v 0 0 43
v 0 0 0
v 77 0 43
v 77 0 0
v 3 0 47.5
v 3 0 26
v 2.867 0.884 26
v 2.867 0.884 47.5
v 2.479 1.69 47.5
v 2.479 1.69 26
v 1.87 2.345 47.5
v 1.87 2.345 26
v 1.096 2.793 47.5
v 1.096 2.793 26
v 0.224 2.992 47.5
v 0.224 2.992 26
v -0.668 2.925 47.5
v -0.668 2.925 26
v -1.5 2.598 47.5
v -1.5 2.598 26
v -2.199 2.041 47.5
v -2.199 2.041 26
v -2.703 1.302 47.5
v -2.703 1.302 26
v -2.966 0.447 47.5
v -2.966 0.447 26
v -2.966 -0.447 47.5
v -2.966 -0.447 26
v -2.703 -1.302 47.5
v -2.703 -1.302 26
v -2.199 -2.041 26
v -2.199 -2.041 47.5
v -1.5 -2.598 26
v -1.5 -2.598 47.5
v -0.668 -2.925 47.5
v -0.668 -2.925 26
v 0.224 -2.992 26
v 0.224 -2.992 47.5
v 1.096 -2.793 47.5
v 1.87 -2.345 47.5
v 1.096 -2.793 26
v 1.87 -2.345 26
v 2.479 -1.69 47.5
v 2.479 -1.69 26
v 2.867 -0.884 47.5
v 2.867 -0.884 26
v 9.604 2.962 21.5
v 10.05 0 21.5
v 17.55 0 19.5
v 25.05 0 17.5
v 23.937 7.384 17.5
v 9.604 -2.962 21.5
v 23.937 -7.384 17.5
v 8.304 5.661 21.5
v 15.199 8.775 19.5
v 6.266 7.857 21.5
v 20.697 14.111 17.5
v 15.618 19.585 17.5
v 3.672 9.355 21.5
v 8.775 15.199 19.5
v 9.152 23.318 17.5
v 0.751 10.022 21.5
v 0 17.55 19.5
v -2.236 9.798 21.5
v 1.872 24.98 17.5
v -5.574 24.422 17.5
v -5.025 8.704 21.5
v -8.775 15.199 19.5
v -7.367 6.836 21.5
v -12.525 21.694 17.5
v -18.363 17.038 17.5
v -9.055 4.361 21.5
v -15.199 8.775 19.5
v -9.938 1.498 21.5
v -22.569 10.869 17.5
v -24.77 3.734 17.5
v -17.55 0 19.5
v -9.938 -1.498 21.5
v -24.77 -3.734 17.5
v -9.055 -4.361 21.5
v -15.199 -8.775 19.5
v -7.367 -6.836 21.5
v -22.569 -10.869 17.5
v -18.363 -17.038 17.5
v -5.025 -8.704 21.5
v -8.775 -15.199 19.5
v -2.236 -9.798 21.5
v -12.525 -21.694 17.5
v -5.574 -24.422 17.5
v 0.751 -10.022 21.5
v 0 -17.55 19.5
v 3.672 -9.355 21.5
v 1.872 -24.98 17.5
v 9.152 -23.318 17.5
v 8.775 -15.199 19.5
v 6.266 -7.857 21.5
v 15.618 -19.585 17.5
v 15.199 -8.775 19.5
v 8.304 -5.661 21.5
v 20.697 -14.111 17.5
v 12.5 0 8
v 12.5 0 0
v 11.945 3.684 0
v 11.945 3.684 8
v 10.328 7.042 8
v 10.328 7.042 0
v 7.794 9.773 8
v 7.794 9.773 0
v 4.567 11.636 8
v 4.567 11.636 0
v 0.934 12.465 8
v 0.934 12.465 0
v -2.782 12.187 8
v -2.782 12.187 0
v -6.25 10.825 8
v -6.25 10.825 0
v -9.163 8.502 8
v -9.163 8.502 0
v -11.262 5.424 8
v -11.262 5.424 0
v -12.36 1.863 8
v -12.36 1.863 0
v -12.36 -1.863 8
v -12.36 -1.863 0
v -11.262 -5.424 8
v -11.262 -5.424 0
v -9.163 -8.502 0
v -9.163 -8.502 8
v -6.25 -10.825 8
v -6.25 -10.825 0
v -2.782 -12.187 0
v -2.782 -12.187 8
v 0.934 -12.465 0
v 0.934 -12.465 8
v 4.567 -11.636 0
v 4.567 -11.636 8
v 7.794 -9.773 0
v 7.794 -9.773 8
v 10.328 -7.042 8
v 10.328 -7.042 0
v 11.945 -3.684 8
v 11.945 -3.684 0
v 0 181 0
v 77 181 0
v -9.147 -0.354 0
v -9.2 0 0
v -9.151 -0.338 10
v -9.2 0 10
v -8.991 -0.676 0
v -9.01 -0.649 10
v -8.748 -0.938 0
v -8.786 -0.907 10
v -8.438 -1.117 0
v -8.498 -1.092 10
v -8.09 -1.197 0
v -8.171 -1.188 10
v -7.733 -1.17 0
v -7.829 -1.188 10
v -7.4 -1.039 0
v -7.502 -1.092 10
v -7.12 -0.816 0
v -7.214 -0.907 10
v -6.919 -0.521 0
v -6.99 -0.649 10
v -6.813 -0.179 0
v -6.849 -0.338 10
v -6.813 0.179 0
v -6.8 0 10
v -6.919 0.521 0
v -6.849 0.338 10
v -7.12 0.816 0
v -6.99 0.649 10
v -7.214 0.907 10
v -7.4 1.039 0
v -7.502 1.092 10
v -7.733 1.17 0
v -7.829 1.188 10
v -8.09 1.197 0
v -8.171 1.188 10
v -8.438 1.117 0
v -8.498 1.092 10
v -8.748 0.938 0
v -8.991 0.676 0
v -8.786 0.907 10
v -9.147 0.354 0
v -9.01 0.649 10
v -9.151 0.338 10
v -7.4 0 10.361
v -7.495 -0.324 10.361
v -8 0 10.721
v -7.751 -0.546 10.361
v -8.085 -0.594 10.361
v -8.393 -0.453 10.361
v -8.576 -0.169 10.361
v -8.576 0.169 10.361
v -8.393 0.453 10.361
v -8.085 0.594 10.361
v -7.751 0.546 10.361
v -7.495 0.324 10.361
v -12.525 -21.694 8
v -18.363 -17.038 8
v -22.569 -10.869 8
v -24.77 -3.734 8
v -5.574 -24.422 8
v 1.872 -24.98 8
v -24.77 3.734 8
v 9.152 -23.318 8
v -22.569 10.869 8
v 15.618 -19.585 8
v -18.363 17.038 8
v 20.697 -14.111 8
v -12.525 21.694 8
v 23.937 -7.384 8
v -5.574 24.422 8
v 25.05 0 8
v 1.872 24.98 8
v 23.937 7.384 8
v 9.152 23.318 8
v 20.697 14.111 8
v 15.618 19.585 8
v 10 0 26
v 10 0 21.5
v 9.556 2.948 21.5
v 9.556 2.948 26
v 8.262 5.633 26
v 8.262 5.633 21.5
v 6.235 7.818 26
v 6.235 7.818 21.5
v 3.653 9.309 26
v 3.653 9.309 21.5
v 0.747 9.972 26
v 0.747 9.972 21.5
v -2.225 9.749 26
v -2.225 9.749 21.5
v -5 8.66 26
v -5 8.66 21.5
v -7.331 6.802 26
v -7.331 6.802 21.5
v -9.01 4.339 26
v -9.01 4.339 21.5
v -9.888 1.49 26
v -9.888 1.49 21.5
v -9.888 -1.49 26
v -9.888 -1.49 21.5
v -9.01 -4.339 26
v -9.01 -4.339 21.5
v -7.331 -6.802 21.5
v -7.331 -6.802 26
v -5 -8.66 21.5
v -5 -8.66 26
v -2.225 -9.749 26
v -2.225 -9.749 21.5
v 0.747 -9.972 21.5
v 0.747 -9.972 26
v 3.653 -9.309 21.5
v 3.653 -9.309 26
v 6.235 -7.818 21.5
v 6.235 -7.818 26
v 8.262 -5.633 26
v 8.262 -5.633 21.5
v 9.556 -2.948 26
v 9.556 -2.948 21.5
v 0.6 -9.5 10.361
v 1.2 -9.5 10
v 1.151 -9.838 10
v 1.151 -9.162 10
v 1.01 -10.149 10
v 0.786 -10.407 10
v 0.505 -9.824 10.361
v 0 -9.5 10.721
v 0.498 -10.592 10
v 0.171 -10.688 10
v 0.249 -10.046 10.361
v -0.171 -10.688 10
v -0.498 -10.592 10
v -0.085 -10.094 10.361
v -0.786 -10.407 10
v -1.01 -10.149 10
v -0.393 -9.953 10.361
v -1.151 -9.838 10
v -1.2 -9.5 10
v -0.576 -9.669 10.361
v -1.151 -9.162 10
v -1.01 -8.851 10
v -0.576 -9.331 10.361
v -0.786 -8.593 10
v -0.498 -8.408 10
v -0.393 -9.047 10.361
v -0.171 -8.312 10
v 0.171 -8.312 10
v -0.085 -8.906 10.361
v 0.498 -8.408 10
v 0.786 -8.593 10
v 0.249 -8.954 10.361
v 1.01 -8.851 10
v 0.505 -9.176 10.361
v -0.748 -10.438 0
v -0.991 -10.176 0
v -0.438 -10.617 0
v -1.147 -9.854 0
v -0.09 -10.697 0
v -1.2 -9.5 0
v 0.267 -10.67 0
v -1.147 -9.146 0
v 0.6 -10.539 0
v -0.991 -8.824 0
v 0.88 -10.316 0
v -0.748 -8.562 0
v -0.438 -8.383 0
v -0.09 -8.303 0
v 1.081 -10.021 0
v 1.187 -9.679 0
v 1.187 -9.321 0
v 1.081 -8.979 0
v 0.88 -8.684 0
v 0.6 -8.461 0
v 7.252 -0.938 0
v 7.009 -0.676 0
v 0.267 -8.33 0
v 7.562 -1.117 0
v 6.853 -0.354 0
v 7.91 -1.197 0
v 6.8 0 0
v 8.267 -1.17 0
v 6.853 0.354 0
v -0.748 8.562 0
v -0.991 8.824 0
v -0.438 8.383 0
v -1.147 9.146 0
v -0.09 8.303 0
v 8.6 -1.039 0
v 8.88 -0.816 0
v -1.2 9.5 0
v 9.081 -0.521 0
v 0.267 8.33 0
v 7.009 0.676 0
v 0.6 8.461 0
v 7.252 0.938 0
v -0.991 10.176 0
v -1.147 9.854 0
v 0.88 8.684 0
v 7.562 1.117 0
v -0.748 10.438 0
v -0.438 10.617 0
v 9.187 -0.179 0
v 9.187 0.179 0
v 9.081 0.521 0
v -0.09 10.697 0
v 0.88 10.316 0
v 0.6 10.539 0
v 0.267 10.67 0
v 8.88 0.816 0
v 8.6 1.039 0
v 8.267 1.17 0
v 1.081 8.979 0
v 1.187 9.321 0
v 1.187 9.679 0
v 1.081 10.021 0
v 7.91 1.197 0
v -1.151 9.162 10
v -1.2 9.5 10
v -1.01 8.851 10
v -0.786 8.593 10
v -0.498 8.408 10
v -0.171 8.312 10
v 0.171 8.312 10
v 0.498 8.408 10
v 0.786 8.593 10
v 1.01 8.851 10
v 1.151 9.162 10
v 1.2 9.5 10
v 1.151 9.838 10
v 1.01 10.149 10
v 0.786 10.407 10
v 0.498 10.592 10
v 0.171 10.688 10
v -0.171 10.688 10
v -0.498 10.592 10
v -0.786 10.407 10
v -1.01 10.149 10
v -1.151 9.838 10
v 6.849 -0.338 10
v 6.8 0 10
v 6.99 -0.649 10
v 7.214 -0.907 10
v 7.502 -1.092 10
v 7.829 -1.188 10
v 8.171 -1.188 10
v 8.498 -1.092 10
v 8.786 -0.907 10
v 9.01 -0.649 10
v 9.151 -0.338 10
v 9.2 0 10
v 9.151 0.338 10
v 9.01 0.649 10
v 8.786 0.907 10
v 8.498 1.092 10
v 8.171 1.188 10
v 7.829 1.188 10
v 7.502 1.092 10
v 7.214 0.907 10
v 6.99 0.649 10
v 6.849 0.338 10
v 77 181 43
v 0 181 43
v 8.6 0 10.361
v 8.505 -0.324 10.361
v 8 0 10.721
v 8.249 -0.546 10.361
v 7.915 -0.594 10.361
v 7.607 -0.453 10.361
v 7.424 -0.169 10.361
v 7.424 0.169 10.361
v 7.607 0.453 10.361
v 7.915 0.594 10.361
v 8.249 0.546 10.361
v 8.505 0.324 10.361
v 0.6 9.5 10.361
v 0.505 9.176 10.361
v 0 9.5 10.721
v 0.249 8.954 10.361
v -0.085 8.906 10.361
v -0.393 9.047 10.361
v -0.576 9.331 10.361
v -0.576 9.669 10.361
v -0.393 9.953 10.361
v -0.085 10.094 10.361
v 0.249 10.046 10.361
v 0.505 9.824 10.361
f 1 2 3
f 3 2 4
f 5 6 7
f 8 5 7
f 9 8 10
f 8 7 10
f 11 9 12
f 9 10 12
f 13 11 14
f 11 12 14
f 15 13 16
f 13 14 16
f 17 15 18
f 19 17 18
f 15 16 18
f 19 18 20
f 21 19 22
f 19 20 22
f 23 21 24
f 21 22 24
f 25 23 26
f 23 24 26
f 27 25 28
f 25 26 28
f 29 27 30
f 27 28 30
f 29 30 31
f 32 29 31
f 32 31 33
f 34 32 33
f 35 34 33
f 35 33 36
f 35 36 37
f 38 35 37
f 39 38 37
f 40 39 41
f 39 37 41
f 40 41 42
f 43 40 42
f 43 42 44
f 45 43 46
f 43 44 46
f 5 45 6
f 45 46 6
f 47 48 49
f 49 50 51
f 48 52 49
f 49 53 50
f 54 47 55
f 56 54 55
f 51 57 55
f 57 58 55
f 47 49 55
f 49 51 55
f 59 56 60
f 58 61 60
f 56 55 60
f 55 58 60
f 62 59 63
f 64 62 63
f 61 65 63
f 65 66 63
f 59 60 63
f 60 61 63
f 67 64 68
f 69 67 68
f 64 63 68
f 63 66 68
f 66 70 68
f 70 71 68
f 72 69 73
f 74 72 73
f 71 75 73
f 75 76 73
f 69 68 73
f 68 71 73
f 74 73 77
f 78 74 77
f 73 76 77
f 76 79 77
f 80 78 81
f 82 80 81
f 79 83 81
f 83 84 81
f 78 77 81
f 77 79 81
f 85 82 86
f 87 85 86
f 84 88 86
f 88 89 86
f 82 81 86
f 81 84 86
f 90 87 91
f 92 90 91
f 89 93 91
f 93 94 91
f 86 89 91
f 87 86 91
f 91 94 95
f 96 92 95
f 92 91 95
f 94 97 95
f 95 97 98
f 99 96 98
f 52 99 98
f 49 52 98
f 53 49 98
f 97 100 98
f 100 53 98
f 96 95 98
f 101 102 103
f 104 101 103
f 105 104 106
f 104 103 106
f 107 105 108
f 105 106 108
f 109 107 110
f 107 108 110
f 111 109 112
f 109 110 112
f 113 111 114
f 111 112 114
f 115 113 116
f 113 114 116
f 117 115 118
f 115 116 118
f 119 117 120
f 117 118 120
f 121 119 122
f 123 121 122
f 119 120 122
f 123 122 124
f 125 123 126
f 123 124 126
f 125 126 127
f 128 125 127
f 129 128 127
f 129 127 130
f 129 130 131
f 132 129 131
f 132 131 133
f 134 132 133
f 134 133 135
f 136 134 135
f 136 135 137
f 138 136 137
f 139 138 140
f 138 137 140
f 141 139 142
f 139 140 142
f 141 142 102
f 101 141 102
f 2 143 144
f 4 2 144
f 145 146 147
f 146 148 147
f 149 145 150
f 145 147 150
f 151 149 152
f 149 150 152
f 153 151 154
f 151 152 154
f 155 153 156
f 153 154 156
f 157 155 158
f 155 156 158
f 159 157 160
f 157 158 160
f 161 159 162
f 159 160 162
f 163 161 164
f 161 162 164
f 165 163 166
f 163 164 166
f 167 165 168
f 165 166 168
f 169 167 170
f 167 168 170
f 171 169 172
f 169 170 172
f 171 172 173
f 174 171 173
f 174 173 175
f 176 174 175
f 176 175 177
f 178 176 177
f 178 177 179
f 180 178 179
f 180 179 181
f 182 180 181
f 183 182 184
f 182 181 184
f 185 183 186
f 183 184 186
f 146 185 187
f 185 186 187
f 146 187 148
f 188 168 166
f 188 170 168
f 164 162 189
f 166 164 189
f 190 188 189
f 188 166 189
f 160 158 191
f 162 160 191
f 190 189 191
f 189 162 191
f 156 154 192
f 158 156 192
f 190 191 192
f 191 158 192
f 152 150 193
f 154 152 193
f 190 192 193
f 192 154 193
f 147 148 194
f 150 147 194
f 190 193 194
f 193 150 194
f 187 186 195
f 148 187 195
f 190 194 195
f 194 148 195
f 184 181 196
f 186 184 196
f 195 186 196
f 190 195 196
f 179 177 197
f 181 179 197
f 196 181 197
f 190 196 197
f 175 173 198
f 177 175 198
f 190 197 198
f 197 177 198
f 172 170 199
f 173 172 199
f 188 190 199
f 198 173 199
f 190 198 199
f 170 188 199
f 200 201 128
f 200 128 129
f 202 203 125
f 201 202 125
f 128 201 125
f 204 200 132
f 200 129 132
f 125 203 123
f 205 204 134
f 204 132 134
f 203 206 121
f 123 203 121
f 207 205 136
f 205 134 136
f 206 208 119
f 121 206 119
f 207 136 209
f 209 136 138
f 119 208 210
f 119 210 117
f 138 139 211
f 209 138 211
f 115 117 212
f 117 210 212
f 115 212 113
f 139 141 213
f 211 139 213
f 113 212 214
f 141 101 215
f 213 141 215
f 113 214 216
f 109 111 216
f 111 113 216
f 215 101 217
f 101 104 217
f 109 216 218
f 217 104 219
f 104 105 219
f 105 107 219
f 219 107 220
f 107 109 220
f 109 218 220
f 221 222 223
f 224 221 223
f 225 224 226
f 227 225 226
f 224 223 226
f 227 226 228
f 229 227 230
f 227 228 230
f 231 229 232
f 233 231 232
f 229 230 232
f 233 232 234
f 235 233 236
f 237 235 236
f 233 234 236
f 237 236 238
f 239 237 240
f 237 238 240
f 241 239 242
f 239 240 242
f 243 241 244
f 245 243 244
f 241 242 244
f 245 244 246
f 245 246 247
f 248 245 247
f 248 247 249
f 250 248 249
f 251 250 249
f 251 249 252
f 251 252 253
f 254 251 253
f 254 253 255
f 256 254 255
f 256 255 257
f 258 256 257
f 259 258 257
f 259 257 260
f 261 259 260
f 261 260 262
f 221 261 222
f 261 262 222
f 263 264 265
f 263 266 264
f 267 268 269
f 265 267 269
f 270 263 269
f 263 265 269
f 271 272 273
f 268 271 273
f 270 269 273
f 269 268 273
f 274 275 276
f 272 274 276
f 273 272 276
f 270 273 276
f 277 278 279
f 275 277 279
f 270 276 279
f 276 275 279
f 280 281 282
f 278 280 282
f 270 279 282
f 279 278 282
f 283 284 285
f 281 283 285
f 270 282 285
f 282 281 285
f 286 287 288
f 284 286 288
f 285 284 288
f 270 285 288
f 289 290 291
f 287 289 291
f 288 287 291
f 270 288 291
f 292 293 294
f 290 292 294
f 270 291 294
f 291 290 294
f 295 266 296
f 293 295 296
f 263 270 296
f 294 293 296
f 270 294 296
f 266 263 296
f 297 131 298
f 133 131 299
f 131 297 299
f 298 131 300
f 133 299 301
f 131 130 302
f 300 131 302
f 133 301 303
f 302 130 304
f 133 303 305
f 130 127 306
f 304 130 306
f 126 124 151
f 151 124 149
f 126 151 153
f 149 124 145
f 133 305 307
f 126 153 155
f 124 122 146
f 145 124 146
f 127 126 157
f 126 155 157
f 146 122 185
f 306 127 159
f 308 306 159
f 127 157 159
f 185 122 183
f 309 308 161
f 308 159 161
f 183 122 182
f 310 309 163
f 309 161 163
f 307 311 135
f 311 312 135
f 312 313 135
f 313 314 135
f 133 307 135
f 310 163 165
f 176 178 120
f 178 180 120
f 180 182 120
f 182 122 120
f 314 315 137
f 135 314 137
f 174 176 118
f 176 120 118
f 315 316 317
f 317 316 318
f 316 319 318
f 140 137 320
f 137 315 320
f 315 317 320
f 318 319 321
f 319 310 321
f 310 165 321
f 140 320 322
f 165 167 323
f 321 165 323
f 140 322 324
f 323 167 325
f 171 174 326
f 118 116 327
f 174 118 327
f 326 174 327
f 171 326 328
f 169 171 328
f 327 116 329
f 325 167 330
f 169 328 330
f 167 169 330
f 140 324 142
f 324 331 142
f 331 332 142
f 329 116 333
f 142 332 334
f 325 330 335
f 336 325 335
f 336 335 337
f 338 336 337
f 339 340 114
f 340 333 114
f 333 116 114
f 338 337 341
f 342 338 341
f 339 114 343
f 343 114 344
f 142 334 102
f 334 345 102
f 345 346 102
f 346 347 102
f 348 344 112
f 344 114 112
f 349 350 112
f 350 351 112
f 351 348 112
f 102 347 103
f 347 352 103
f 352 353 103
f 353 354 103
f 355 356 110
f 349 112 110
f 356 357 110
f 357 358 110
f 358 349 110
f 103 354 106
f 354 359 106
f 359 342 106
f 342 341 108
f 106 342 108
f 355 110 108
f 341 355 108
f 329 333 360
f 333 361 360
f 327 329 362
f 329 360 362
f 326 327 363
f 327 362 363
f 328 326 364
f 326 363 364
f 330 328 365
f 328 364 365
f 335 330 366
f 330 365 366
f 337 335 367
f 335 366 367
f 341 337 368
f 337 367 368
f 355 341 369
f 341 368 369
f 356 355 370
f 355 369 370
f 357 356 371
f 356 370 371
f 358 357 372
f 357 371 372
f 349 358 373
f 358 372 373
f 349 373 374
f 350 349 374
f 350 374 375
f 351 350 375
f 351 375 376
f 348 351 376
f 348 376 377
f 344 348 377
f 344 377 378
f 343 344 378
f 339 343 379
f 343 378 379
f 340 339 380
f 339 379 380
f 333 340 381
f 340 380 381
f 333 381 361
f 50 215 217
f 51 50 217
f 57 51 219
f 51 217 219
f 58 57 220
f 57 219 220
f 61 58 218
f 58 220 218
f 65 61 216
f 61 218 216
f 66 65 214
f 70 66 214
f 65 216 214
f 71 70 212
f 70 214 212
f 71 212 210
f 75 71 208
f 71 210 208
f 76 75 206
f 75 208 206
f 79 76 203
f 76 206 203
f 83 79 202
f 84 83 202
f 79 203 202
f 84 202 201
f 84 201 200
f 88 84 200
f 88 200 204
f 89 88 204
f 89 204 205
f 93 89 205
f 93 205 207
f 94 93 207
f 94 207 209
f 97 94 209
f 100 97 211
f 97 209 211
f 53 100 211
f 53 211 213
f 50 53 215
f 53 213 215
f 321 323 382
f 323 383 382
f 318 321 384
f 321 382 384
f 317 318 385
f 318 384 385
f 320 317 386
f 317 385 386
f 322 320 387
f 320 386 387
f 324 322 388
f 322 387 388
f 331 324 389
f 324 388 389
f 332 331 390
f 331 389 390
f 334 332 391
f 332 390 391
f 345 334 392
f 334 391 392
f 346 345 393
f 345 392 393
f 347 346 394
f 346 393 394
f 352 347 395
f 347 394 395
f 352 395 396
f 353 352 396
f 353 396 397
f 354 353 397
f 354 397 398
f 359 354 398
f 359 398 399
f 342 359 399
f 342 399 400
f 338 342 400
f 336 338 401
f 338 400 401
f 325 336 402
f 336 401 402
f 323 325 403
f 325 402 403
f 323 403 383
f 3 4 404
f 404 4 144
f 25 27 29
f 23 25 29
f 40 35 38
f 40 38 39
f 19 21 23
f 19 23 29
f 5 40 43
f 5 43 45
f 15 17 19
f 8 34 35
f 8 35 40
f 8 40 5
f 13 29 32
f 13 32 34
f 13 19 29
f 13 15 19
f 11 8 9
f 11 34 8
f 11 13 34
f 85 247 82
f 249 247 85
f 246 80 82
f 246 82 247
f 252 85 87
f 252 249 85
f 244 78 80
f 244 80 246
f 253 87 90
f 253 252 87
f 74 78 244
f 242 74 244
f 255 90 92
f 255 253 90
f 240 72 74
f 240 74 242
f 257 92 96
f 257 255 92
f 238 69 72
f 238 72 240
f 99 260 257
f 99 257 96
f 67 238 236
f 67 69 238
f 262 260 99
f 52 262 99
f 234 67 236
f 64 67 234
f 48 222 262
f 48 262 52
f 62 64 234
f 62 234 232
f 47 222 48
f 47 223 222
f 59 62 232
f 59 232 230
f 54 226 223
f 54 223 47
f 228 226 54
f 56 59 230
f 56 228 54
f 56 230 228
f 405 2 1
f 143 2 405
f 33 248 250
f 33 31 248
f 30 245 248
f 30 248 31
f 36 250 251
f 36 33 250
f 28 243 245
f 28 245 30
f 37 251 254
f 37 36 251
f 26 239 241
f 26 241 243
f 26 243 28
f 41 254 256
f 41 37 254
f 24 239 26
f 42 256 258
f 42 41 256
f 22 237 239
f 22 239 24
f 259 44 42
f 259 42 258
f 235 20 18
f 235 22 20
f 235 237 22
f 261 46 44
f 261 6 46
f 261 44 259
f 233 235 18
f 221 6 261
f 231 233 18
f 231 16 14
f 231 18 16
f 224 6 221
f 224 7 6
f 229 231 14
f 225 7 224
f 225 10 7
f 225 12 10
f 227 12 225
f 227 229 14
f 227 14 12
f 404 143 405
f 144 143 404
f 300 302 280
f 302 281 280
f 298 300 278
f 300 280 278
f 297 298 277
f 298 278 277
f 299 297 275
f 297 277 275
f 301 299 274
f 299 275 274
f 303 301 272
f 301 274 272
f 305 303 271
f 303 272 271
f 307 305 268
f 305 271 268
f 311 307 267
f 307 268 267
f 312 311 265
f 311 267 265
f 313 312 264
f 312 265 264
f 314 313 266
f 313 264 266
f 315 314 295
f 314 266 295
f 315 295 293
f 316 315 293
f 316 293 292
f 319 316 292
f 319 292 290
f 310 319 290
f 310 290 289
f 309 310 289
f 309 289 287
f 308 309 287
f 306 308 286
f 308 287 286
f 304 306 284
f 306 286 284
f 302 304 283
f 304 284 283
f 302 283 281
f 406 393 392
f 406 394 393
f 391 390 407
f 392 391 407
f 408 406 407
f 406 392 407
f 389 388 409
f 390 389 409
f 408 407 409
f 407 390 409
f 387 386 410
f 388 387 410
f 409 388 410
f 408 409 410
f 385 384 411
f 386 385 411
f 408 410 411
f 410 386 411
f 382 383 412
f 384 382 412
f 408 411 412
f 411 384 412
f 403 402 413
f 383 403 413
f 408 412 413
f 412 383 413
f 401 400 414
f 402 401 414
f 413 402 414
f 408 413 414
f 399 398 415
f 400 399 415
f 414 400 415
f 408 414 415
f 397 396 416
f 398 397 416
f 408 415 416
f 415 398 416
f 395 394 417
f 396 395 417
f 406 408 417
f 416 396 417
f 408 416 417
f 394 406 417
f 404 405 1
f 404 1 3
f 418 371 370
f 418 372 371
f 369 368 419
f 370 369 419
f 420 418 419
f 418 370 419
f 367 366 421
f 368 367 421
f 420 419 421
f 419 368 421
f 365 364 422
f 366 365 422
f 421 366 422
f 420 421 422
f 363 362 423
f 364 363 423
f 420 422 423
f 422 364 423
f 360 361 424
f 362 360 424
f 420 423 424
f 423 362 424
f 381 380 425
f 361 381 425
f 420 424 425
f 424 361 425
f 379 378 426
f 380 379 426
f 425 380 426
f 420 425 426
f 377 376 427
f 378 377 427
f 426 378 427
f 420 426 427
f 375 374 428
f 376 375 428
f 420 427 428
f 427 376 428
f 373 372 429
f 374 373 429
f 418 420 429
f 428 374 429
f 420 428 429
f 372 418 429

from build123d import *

# Parameters (mm, degrees)
F0_R      = 12.5
F1_DEPTH  = 8
F2_R      = 25.05
F3_DEPTH  = 13.5
F4_SIZE2  = 4
F4_SIZE   = 15
F6_D      = 2.4
F6_DEPTH  = 10
F6_TIP    = 0.7210327428
F7_R      = 10
F8_DEPTH  = 4.5
F9_R      = 3
F10_DEPTH = 21.5
F11_W     = 77
F11_H     = 181
F12_DEPTH = 43


with BuildPart() as f1:
    # F0 (on Top) → F1 (new body)
    with BuildSketch(Plane.XY):
        Circle(F0_R)
    extrude(amount=F1_DEPTH)

    # F2 (on face) → F3 (join)
    with BuildSketch(Plane.XY.offset(8)):
        Circle(F2_R)
    extrude(amount=F3_DEPTH)

    # F4
    f4_edges = [f1.edges().sort_by_distance(p)[0] for p in [
        (-25.05, 0, 21.5),
    ]]
    f4_side = f1.faces().sort_by_distance((0, 0, 21.5))[0]
    chamfer(f4_edges, length=F4_SIZE, length2=F4_SIZE2, reference=f4_side)

    # F6
    with Locations(Plane(origin=(0, 0, 0), x_dir=(1, 0, 0), z_dir=(0, 0, -1))):
        with Locations((0, 9.5), (0, -9.5), (8, 0), (-8, 0)):
            Hole(F6_D / 2, depth=F6_DEPTH)
            with Locations((0, 0, -(F6_DEPTH + F6_TIP / 2))):  # 118° drill point
                Cone(0, F6_D / 2, F6_TIP, mode=Mode.SUBTRACT)

    # F7 (on face) → F8 (join)
    with BuildSketch(Plane.XY.offset(21.5)):
        Circle(F7_R)
    extrude(amount=F8_DEPTH)

    # F9 (on face) → F10 (join)
    with BuildSketch(Plane.XY.offset(26)):
        Circle(F9_R)
    extrude(amount=F10_DEPTH)


with BuildPart() as f12:
    # F11 (on Top) → F12 (new body)
    with BuildSketch(Plane.XY):
        with Locations((38.5, 90.5)):
            Rectangle(F11_W, F11_H)
    extrude(amount=F12_DEPTH)


solid = Compound([f1.part, f12.part])
